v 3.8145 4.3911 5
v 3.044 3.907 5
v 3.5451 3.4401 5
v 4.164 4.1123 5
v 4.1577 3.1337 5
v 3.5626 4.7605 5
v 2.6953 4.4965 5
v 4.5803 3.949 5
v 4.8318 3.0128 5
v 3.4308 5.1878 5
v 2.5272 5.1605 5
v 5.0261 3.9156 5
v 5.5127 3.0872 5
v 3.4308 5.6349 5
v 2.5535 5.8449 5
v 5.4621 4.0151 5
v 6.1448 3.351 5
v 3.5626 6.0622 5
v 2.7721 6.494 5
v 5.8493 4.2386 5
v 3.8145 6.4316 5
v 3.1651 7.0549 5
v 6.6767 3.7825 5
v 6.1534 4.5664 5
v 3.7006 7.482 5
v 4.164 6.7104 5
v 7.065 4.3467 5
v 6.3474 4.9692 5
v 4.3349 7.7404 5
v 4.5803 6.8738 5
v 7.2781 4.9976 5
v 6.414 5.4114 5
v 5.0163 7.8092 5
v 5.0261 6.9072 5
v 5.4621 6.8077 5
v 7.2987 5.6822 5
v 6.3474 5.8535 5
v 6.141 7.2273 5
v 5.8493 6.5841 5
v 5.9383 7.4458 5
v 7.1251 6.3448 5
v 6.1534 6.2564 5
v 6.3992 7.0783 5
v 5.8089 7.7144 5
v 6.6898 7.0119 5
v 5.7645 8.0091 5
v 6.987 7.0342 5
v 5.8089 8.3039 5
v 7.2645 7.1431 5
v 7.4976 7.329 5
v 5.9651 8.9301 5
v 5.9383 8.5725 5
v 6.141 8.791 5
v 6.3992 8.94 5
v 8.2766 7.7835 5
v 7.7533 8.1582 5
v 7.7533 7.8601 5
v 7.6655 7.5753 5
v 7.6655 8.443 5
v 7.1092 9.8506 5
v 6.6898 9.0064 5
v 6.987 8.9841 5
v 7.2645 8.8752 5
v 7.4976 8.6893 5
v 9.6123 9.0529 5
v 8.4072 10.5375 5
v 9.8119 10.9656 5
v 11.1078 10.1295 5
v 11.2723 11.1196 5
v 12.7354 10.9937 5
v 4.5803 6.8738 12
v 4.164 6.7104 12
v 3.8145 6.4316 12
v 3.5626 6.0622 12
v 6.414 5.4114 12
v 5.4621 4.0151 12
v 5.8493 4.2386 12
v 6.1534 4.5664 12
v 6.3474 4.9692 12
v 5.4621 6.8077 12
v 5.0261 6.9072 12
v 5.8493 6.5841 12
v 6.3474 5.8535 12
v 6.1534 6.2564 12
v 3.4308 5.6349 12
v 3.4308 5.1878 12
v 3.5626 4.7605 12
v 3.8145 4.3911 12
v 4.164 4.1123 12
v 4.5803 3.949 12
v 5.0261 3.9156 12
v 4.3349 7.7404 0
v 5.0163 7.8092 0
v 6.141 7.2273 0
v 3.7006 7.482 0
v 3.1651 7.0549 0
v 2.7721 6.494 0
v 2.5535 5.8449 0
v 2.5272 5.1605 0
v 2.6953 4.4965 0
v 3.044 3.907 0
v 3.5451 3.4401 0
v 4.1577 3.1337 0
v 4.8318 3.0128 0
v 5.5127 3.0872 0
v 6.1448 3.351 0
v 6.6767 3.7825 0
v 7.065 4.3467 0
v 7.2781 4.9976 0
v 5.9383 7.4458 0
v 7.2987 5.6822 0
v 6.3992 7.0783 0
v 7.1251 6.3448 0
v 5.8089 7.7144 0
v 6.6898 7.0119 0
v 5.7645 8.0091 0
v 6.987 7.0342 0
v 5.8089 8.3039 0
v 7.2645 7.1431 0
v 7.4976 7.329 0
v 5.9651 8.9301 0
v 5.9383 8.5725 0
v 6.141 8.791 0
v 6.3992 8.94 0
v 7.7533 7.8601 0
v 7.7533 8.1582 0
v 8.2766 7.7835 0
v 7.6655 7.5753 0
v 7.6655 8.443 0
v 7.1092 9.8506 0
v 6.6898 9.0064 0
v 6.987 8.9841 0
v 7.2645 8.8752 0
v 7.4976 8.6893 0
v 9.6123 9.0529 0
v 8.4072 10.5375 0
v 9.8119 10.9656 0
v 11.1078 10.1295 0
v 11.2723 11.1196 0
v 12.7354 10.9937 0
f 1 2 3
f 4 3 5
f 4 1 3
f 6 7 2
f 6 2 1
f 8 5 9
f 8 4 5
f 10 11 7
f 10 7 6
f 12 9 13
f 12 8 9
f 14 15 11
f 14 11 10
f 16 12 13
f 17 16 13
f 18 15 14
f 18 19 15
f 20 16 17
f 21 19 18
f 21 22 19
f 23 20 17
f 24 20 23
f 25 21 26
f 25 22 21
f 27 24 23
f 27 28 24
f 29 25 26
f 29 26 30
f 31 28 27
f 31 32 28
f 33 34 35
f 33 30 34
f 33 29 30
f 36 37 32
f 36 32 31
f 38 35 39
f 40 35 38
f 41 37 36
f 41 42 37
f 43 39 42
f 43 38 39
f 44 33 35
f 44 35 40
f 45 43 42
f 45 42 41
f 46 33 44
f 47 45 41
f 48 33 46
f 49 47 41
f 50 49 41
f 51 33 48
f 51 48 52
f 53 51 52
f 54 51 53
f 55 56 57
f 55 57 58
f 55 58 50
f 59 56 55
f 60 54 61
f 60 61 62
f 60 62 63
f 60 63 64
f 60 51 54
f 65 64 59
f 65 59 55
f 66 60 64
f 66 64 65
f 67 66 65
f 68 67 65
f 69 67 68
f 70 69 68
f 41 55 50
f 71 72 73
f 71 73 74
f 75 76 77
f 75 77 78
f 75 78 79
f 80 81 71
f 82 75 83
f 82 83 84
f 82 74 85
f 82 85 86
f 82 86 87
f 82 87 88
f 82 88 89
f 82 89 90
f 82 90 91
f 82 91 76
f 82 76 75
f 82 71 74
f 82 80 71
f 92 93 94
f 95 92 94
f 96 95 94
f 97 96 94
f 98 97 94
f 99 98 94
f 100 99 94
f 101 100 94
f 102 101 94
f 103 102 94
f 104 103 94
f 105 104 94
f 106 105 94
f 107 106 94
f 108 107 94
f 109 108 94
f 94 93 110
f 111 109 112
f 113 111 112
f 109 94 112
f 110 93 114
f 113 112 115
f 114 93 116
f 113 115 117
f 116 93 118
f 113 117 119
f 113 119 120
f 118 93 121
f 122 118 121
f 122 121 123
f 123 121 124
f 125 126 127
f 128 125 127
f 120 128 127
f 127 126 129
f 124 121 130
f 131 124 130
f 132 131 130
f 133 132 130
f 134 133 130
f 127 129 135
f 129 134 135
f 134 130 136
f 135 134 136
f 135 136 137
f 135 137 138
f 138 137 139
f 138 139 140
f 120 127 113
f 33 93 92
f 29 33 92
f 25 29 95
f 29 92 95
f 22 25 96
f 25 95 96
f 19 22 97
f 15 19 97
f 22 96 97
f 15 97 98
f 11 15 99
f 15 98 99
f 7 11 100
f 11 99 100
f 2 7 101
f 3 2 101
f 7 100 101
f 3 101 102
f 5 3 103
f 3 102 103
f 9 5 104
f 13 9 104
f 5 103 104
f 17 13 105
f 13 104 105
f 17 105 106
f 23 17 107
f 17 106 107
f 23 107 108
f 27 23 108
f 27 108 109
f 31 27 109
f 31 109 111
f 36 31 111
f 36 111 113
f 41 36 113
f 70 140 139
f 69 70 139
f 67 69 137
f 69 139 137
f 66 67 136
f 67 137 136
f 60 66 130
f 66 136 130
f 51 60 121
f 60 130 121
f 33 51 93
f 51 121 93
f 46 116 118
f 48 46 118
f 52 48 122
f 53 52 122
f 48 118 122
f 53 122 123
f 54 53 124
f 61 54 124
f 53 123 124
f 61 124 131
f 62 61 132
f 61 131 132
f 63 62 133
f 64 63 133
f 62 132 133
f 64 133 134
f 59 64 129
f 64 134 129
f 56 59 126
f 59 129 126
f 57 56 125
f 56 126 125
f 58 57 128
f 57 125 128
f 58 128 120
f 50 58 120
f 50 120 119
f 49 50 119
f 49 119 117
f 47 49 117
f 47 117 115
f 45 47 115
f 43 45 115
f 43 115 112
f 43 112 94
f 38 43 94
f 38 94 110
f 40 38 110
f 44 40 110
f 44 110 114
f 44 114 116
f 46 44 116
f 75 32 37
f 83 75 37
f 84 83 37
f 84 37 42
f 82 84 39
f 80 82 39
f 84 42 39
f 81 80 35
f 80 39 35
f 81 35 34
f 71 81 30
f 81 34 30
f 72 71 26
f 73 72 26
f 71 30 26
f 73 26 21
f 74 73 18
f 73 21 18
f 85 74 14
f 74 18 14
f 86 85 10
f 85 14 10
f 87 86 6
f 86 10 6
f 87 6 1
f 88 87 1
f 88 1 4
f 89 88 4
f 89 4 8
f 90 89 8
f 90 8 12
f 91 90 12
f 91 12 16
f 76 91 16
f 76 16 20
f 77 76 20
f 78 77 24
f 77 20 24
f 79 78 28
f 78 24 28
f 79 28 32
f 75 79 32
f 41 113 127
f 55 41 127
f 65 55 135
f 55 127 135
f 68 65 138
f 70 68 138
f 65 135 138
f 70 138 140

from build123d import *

# Parameters (mm, degrees)
BOSS_EXTRUDE1_DEPTH = 5
SKETCH2_R           = 1.5
BOSS_EXTRUDE2_DEPTH = 7
SKETCH4_R           = 1
CUT_EXTRUDE1_DEPTH  = 21.732622043


with BuildPart() as part:
    # Sketch1 → Boss-Extrude1 (new body)
    with BuildSketch(Plane.XY):
        with BuildLine():
            ThreePointArc((12.735353306, 10.993667304), (8.407166921, 10.537476108), (5.016332041, 7.809189722))
            ThreePointArc((5.016332041, 7.809189722), (3.545099052, 3.440082341), (7.125107355, 6.34476242))
            ThreePointArc((7.125107355, 6.34476242), (9.612326684, 9.052857395), (12.735353306, 10.993667304))
        make_face()
    extrude(amount=BOSS_EXTRUDE1_DEPTH)

    # Sketch2 → Boss-Extrude2 (add)
    with BuildSketch(Plane.XY.offset(5)):
        with Locations((4.914048995, 5.411370258)):
            Circle(SKETCH2_R)
    extrude(amount=BOSS_EXTRUDE2_DEPTH)

    # Sketch4 → Cut-Extrude1 (cut, through all)
    with BuildSketch(Plane(origin=(0, 0, 0), x_dir=(-1, 0, 0), z_dir=(0, 0, -1))):
        with Locations((-6.764513076, 8.009147455)):
            Circle(SKETCH4_R)
    extrude(amount=-CUT_EXTRUDE1_DEPTH, mode=Mode.SUBTRACT)


solid = part.part
